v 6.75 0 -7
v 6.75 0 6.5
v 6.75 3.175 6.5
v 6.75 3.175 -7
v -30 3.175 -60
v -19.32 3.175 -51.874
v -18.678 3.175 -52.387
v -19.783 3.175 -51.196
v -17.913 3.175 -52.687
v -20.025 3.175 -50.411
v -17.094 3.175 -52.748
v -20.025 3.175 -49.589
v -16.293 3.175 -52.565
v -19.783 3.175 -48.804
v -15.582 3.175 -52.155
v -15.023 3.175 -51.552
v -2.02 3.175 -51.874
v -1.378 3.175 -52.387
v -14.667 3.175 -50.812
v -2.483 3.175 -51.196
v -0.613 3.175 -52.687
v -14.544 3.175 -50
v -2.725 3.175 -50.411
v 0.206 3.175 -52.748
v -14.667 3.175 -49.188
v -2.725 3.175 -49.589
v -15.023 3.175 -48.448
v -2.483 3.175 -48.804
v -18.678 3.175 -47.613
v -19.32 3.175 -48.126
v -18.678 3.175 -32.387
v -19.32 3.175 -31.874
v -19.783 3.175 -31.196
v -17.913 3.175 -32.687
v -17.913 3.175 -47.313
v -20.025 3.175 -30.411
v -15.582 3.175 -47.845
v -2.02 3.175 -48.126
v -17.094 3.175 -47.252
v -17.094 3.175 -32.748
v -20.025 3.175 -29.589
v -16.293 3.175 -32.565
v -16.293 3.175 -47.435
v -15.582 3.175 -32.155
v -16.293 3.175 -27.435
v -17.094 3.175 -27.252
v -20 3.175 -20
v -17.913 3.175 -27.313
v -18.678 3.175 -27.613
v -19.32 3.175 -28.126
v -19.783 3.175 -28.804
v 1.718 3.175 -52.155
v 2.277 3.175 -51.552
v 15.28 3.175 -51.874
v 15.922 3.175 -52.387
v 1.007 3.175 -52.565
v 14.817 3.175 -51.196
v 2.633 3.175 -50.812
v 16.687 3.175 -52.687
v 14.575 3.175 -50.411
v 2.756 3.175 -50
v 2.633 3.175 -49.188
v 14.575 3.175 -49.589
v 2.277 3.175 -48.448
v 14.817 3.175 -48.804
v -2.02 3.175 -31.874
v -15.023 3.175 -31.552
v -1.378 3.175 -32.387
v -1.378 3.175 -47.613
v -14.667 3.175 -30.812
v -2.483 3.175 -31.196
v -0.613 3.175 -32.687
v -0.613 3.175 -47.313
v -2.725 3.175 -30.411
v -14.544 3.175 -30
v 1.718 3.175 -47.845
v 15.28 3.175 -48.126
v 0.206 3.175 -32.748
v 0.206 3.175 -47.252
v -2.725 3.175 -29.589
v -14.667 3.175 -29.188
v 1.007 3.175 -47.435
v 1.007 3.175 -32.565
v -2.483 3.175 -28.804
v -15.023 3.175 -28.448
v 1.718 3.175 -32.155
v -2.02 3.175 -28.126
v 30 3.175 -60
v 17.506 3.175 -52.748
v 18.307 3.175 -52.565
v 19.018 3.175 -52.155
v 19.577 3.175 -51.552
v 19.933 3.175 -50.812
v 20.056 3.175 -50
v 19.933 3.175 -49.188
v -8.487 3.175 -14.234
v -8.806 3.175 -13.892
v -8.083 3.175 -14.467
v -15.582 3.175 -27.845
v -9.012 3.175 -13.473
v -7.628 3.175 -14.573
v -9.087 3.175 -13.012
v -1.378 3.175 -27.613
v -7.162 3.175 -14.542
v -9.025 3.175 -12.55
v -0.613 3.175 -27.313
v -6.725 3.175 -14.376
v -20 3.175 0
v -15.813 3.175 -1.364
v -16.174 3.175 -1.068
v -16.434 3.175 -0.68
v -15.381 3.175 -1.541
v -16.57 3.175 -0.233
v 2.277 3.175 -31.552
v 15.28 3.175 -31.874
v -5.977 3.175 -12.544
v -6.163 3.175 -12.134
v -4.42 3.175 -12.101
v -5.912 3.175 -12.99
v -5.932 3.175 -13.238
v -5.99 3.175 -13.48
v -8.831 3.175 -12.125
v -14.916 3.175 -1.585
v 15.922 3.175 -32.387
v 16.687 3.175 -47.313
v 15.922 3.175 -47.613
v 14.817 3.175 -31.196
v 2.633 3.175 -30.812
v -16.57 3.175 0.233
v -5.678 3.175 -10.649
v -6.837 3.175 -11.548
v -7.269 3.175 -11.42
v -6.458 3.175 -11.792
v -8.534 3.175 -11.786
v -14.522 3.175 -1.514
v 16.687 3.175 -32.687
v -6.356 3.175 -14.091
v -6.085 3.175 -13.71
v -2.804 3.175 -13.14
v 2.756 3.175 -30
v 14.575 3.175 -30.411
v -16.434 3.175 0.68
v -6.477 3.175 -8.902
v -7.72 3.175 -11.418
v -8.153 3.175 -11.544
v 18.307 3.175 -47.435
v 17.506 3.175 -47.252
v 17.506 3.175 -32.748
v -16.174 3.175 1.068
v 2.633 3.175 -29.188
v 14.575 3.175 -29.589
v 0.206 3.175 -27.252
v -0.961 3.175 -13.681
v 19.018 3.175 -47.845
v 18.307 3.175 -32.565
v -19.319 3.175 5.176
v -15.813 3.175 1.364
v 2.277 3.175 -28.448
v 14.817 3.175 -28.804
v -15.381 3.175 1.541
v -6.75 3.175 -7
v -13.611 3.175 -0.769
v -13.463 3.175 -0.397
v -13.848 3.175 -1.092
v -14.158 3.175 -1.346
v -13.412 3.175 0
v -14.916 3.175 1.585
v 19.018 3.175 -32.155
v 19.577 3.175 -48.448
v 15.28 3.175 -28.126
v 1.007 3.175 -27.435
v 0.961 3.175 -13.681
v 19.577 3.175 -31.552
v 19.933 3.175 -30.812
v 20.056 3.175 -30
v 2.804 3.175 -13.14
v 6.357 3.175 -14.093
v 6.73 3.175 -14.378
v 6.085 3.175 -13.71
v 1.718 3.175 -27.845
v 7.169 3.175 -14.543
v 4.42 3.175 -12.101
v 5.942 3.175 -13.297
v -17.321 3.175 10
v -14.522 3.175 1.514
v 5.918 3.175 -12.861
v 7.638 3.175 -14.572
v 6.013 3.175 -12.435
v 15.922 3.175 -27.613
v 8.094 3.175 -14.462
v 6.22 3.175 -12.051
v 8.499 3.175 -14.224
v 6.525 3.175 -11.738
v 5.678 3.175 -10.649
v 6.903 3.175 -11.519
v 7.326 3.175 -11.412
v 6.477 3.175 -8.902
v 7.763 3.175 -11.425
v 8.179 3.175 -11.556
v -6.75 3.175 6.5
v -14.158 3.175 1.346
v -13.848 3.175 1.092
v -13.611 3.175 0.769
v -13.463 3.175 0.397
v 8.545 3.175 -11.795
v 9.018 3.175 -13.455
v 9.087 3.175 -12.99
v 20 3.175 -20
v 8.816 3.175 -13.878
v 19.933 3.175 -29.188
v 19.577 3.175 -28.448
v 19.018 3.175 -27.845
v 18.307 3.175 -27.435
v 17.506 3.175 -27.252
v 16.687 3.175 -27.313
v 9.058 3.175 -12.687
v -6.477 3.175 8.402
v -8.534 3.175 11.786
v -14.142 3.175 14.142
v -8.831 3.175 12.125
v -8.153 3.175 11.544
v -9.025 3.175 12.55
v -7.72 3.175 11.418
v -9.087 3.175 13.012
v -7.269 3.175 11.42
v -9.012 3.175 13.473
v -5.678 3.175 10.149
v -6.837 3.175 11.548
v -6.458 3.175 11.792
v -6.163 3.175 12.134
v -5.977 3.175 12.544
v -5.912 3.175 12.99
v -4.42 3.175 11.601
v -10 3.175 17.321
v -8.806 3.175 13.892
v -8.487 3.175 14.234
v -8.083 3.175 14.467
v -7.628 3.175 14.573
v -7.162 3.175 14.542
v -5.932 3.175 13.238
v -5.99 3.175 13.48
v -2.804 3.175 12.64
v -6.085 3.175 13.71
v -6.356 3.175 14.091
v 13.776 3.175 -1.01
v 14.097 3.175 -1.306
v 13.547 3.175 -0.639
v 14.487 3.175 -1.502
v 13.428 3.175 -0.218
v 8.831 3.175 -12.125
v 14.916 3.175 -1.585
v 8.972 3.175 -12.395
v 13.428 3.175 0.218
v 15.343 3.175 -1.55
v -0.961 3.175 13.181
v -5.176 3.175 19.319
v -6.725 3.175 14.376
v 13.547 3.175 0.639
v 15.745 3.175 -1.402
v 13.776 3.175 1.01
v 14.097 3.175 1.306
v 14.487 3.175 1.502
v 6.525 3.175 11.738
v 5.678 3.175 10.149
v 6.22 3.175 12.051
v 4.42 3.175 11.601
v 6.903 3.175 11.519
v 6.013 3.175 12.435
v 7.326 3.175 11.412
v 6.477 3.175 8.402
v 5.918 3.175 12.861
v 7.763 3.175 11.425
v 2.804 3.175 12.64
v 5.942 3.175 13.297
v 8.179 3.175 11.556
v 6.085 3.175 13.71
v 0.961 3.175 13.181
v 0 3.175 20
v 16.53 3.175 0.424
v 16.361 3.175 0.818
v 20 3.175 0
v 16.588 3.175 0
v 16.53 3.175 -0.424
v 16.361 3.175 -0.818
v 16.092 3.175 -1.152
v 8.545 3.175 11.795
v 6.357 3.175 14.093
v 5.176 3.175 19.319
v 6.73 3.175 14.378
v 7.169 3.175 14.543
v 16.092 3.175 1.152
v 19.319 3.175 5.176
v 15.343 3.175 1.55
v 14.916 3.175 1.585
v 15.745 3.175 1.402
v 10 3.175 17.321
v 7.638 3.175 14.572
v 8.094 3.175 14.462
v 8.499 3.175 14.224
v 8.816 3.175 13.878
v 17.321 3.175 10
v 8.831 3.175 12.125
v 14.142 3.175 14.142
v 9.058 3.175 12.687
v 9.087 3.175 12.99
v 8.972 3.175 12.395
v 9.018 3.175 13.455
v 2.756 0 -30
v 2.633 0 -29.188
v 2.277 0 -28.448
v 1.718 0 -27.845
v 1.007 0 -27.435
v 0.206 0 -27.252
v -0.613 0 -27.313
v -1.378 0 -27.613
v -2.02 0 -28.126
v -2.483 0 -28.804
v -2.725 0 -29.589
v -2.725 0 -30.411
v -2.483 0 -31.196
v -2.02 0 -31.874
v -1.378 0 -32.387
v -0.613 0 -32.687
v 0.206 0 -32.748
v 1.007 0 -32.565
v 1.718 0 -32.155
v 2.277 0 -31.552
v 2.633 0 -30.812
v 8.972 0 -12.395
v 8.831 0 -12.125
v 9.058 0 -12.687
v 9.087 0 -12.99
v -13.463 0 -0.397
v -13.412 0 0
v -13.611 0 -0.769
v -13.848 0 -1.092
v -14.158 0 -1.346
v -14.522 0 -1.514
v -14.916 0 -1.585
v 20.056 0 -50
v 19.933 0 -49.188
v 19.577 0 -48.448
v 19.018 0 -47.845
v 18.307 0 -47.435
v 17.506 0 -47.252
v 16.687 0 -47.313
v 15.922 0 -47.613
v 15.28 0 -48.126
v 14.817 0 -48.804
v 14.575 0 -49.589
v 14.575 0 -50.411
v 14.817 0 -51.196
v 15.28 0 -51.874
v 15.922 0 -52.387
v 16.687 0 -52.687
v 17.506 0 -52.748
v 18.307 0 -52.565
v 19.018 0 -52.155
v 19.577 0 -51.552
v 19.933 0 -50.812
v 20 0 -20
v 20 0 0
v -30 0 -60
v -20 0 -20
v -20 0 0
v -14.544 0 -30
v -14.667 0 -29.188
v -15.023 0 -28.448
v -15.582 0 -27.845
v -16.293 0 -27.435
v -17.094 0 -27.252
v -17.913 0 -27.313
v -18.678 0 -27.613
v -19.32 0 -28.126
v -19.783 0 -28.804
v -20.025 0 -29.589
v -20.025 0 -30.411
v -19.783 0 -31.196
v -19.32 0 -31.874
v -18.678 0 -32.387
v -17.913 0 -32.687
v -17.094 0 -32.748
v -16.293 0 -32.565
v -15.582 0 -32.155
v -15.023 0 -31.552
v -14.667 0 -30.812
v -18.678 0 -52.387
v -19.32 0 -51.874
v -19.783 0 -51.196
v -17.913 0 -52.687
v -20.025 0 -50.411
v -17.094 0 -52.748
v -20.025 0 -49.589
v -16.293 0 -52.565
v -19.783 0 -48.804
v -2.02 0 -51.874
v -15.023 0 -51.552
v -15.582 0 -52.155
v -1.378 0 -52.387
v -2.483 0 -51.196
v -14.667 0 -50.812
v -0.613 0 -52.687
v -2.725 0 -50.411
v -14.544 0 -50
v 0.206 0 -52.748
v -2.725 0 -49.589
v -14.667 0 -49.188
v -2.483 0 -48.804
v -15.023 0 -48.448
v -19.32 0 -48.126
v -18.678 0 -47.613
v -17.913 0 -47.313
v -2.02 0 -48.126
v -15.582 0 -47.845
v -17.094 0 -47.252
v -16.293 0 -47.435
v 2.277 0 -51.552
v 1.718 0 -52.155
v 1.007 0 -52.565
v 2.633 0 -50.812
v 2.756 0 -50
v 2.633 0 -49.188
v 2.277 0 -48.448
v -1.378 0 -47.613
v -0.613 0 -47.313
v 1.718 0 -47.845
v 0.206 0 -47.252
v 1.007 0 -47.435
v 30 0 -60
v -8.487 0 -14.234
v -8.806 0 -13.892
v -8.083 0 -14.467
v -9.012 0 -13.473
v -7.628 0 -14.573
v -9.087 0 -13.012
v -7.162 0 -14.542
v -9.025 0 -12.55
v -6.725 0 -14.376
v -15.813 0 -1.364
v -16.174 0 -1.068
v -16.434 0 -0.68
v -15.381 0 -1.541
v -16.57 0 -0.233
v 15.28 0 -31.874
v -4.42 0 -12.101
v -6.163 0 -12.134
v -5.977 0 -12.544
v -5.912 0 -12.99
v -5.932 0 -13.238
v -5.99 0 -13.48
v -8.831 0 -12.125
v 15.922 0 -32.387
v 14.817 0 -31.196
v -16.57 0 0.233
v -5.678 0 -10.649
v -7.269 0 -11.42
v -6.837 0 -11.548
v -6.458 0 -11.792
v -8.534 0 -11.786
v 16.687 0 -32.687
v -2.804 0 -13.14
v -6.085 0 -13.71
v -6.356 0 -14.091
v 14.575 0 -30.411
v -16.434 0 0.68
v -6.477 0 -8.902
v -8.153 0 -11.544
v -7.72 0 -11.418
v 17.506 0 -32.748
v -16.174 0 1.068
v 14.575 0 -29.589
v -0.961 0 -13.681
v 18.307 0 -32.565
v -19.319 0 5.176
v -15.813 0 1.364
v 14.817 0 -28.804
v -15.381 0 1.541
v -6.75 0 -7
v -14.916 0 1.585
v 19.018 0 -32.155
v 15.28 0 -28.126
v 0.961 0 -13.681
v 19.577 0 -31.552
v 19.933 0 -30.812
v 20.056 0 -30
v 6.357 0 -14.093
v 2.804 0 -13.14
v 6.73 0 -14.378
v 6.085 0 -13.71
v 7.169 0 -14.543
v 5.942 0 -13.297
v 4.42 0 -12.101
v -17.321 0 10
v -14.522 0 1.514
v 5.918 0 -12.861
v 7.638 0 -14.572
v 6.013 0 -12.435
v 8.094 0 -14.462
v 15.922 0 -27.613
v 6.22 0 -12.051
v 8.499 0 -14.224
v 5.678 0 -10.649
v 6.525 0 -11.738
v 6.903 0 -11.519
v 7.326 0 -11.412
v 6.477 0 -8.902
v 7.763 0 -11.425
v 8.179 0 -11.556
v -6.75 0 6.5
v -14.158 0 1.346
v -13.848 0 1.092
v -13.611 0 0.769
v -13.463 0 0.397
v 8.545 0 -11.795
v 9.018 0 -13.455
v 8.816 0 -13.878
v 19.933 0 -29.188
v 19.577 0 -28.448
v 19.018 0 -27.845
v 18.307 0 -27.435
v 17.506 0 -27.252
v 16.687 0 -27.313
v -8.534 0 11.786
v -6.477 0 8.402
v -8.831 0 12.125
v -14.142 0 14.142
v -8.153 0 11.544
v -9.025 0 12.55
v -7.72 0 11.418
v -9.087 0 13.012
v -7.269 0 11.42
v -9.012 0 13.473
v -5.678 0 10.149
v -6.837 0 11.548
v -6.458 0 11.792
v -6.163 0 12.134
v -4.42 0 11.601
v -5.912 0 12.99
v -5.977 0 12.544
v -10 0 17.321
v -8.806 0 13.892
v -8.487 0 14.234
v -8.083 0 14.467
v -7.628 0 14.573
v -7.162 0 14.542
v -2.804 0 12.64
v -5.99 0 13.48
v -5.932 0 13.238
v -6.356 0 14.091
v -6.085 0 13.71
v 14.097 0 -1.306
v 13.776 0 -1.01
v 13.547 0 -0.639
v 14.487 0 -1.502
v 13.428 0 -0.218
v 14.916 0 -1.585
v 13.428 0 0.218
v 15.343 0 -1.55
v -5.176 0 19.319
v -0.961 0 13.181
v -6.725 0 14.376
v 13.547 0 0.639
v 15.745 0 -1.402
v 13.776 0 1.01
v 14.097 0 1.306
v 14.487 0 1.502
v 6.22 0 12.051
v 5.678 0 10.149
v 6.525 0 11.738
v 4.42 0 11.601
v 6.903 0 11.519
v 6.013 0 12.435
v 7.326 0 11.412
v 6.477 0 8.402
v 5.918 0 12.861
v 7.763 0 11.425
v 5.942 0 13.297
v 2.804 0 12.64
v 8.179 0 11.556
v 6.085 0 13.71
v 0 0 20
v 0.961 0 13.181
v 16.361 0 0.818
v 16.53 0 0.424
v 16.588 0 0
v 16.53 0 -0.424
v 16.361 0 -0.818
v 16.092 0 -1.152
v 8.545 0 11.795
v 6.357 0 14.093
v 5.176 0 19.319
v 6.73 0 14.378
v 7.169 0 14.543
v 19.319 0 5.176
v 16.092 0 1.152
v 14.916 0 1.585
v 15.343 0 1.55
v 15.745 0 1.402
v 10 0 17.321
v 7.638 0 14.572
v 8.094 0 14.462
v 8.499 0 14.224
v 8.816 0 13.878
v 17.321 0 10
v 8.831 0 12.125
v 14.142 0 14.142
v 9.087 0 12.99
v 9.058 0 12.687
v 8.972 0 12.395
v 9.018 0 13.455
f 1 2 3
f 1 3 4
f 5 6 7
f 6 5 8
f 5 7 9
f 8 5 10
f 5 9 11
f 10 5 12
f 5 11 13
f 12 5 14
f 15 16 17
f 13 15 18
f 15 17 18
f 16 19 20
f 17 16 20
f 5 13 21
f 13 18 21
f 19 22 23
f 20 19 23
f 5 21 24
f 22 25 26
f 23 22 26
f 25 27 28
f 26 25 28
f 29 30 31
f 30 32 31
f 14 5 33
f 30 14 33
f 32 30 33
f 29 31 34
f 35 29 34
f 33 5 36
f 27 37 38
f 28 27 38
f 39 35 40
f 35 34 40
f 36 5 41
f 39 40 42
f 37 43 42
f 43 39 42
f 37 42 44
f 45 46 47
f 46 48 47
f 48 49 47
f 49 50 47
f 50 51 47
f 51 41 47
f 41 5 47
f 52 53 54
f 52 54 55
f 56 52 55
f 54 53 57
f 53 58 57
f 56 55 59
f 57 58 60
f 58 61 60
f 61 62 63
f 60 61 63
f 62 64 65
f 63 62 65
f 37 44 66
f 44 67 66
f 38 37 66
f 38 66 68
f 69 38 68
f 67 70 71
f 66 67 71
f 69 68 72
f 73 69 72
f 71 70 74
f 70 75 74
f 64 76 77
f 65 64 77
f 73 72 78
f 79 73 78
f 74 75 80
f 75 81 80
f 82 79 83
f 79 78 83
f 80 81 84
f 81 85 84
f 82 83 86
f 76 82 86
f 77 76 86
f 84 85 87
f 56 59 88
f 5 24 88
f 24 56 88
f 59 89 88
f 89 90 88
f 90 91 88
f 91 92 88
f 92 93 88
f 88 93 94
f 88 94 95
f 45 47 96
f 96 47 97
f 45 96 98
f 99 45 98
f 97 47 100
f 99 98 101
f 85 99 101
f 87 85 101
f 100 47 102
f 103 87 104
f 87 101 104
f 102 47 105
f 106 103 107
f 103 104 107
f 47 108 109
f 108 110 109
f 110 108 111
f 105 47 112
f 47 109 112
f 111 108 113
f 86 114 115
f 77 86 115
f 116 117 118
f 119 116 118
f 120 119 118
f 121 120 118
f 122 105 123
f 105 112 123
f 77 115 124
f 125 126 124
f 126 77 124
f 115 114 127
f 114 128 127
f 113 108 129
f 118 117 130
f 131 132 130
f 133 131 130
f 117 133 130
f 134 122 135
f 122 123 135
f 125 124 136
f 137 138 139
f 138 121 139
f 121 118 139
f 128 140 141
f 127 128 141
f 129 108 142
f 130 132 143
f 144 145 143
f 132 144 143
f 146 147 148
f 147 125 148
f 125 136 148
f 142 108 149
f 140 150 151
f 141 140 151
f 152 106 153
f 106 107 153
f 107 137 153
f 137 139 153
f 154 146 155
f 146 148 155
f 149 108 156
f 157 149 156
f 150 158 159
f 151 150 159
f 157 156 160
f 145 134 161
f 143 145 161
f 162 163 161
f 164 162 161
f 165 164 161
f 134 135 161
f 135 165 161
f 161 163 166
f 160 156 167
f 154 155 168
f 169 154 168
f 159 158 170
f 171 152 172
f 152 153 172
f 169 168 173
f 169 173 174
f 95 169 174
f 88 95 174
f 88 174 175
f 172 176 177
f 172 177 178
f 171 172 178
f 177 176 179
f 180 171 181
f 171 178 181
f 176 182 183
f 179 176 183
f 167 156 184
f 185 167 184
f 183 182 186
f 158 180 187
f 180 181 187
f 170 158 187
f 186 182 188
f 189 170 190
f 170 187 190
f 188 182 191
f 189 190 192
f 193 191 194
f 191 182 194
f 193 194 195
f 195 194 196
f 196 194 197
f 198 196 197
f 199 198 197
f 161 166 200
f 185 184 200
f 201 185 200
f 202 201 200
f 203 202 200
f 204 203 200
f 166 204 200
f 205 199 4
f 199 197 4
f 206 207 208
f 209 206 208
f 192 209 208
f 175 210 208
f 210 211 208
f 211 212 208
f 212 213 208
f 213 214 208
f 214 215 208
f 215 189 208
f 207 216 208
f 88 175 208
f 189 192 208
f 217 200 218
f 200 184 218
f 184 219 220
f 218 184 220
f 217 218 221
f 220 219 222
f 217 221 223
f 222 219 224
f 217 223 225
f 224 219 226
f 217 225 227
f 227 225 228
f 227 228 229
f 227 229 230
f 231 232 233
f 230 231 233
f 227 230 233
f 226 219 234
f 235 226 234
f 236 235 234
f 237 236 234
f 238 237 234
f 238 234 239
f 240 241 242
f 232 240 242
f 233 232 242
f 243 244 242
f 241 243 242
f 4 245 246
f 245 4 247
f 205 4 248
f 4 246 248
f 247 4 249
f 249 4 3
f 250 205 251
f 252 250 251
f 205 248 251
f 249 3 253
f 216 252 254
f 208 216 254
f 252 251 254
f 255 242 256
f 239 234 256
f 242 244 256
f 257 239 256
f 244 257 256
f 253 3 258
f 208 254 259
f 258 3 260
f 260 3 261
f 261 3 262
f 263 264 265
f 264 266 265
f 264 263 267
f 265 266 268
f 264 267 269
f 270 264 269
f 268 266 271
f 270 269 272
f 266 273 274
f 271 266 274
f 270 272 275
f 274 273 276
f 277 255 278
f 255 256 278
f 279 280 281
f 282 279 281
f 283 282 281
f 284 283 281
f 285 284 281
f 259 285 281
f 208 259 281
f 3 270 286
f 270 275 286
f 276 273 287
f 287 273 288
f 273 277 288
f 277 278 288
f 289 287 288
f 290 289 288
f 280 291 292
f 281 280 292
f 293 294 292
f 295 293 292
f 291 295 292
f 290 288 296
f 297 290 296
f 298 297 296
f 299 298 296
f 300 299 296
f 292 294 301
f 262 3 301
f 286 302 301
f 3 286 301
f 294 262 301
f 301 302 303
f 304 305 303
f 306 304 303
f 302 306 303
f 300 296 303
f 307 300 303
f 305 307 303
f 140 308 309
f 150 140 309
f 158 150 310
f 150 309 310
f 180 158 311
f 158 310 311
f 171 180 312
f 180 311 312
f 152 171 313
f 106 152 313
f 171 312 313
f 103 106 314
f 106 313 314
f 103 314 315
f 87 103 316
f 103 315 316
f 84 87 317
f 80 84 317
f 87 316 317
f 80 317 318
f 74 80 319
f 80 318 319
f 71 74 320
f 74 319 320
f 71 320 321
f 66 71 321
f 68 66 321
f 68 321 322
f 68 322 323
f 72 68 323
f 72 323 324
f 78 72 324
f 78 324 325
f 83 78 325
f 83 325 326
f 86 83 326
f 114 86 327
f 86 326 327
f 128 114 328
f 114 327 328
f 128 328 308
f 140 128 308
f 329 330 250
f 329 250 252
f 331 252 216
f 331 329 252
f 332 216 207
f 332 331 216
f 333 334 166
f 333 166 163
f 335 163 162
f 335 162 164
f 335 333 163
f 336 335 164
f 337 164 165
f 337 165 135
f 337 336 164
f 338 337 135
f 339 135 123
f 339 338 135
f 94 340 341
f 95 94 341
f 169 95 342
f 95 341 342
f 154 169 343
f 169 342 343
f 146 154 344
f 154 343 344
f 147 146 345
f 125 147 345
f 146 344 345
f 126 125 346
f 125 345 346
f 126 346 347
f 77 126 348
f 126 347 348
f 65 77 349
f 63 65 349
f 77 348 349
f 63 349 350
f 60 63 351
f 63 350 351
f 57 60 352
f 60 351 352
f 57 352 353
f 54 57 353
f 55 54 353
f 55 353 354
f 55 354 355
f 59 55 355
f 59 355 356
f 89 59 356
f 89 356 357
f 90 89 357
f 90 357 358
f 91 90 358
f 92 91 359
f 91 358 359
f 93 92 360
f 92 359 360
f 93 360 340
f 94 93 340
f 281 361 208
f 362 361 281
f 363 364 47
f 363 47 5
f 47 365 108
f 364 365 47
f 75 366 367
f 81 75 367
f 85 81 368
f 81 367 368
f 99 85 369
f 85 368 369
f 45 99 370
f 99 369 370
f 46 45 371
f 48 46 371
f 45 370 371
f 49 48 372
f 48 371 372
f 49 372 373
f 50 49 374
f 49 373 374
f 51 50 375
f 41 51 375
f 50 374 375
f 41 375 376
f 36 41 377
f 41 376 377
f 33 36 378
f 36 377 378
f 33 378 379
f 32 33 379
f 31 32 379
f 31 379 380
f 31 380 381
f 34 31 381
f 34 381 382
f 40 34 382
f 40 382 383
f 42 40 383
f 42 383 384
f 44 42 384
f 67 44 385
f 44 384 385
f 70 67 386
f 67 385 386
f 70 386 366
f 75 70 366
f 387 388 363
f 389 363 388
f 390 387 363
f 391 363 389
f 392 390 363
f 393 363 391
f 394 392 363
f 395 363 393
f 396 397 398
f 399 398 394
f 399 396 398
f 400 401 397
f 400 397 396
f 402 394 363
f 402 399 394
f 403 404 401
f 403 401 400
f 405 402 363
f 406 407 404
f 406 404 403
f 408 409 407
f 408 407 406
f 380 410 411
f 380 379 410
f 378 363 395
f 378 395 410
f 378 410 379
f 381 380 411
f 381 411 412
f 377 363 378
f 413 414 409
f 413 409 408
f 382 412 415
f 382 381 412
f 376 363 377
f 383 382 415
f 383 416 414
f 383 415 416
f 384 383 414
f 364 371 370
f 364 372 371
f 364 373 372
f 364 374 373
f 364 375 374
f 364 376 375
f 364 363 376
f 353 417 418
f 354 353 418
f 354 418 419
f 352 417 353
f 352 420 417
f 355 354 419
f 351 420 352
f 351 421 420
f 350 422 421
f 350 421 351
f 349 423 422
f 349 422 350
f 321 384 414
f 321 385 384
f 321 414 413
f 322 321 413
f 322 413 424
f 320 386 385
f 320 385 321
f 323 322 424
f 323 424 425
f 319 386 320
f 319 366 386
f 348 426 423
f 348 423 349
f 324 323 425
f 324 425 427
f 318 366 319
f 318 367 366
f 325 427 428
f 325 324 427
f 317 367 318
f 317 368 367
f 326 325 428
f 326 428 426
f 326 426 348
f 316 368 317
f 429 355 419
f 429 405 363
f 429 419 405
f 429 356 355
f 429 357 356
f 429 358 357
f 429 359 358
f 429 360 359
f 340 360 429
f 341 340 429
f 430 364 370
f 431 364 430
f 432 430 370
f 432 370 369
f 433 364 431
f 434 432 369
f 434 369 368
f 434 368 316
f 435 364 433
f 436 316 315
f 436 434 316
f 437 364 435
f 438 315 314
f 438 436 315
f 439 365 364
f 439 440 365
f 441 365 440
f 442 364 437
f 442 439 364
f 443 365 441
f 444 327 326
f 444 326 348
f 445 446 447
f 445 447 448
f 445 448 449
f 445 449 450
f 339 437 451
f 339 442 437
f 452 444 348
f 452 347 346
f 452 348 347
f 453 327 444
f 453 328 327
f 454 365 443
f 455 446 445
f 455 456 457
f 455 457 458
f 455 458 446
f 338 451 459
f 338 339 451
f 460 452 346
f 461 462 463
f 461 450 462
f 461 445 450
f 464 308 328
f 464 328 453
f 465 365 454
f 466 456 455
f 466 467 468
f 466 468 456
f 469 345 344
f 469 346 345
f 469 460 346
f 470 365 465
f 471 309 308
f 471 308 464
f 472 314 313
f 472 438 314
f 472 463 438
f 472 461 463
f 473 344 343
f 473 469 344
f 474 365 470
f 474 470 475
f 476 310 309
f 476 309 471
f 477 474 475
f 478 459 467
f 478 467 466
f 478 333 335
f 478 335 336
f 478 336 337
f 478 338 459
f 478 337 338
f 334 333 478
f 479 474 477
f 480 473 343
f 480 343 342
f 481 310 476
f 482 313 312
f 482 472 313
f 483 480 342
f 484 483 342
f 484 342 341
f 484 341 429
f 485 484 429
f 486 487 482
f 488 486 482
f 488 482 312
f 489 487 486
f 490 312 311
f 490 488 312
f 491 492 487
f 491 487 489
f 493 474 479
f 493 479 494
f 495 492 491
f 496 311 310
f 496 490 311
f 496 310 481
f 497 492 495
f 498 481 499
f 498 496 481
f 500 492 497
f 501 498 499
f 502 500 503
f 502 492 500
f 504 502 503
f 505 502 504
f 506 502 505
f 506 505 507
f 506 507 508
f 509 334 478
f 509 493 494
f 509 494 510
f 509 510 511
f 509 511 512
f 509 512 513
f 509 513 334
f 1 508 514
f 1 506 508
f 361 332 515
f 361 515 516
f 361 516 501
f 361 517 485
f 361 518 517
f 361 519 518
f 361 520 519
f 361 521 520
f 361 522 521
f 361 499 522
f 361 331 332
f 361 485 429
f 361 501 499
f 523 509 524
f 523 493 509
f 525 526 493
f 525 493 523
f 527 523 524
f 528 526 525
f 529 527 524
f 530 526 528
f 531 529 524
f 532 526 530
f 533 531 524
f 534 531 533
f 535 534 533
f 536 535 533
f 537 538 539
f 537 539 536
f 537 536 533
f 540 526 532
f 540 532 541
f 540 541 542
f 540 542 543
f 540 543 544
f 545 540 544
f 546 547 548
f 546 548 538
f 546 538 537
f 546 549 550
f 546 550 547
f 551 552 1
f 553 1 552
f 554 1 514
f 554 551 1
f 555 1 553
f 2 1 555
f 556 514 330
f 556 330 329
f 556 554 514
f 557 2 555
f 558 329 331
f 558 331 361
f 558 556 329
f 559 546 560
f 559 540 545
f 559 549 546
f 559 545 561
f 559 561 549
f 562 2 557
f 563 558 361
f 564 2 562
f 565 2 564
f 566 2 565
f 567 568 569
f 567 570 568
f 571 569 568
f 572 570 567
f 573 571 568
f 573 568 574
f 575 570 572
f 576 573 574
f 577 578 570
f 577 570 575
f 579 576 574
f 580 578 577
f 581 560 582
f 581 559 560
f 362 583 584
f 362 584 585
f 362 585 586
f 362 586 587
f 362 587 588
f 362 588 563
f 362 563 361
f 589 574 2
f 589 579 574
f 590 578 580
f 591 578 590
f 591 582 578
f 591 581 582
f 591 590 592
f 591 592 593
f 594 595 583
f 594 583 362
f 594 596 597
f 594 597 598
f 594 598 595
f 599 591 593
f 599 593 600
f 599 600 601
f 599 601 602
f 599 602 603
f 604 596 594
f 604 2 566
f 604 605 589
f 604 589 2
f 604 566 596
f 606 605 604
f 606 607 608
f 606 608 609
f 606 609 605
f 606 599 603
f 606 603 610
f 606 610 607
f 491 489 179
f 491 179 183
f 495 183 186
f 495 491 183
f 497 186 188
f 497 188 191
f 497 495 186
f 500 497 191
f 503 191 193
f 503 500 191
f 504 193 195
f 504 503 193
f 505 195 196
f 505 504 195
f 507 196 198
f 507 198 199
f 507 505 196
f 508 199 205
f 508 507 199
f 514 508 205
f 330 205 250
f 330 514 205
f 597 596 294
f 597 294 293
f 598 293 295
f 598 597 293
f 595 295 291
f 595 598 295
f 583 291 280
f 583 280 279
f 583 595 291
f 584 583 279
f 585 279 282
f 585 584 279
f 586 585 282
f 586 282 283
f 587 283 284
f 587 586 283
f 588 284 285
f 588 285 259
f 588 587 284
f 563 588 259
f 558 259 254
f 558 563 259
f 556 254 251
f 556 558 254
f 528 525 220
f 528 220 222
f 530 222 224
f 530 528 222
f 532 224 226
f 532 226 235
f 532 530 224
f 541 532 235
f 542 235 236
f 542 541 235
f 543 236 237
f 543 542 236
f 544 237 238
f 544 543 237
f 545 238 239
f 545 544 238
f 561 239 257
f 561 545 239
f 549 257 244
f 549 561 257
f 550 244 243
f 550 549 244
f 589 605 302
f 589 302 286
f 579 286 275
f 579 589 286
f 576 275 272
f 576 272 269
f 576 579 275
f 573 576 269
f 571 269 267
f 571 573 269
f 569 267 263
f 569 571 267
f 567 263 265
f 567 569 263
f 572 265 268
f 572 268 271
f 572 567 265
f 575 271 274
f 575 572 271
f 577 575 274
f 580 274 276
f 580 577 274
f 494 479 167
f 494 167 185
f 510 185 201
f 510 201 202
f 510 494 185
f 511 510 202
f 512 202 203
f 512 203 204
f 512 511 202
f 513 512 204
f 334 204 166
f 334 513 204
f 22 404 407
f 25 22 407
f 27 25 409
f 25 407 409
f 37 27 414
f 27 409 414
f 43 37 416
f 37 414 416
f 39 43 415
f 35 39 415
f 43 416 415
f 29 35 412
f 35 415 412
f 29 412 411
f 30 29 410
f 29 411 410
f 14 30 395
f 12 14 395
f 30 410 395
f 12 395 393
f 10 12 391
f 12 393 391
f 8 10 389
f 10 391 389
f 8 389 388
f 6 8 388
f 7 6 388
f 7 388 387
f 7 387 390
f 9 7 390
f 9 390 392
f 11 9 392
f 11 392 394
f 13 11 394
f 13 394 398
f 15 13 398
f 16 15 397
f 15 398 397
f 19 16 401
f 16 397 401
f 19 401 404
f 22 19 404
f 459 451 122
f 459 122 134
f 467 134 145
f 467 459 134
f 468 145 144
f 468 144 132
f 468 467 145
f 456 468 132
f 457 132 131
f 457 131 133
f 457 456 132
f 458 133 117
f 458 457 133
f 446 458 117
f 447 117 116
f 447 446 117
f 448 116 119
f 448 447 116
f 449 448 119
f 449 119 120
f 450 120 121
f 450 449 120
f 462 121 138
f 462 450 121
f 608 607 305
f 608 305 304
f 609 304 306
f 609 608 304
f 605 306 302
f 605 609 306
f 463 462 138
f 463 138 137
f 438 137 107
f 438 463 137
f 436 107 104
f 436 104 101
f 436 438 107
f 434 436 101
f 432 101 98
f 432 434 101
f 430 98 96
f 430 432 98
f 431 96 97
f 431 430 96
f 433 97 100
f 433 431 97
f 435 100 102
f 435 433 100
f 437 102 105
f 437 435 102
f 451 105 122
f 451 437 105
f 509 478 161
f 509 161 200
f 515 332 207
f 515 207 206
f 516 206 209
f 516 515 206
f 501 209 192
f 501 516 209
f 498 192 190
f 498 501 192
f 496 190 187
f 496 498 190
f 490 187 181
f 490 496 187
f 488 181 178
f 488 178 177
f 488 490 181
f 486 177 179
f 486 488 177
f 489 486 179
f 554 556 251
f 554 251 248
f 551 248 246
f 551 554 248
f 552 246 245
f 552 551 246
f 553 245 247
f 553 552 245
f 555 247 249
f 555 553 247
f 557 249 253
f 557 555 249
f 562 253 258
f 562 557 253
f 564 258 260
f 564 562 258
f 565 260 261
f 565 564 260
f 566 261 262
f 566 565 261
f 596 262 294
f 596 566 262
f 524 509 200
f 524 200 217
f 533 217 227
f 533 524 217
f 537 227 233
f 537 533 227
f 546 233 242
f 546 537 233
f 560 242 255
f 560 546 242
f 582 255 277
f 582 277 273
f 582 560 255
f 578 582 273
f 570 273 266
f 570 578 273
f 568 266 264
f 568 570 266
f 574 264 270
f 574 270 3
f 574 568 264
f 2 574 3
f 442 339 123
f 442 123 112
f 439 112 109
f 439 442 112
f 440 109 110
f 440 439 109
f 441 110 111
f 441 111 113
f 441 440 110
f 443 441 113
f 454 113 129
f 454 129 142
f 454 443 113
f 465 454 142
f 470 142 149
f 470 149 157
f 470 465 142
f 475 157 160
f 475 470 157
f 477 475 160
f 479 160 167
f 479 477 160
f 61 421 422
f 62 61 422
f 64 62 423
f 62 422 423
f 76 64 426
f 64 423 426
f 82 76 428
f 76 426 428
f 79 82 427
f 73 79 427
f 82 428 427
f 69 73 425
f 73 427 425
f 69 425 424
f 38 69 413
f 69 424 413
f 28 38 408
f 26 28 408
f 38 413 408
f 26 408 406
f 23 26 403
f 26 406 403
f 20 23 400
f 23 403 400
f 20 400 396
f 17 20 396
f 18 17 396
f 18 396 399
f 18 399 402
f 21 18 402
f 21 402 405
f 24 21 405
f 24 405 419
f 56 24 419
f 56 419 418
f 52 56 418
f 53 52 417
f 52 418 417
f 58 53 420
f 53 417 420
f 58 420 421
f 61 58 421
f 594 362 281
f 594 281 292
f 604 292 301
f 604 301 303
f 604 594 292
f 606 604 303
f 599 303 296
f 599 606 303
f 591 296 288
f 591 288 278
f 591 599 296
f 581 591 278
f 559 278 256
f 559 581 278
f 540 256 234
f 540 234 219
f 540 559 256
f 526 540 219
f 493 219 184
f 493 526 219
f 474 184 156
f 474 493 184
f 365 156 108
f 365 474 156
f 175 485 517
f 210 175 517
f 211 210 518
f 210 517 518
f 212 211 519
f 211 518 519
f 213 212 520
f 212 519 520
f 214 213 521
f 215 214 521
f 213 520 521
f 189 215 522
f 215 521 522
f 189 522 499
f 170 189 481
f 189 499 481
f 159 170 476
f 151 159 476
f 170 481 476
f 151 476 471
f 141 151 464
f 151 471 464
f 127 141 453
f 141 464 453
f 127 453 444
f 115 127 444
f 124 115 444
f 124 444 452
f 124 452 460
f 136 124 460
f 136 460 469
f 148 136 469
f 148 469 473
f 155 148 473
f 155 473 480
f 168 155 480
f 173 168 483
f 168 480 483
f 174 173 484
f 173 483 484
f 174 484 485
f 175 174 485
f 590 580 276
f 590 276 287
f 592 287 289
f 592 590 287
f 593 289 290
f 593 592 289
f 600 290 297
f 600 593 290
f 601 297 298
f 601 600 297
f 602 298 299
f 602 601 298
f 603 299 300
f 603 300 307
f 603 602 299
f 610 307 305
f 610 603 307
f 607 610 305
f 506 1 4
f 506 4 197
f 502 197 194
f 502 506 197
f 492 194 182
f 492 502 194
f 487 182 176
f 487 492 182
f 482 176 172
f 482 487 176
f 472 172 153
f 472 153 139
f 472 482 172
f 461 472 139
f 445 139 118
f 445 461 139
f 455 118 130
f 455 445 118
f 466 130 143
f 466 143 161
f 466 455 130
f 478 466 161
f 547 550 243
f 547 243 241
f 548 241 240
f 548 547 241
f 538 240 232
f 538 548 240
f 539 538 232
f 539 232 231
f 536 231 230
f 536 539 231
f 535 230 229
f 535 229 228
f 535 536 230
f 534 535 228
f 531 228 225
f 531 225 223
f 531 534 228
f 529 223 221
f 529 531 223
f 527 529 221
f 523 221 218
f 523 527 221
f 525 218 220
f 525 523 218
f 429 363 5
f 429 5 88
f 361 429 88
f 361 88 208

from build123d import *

# Parameters (mm, degrees)
F0_R     = 2.7559
F1_DEPTH = 3.175


with BuildPart() as f1:
    # F0 (on Front) → F1 (new body)
    with BuildSketch(Plane.XZ):
        with BuildLine():
            Line((20, -20), (20, 0))
            ThreePointArc((20, 0), (0, 20), (-20, 0))
            Line((-20, 0), (-20, -20))
            Line((-20, -20), (-30, -60))
            Line((-30, -60), (30, -60))
            Line((30, -60), (20, -20))
        make_face()
        with Locations((-17.3, -49.9999946)):
            Circle(F0_R, mode=Mode.SUBTRACT)
        with Locations((-17.3, -29.9999946)):
            Circle(F0_R, mode=Mode.SUBTRACT)
        with Locations((0, -49.9999946)):
            Circle(F0_R, mode=Mode.SUBTRACT)
        with Locations((17.3, -49.9999946)):
            Circle(F0_R, mode=Mode.SUBTRACT)
        with Locations((0, -29.9999946)):
            Circle(F0_R, mode=Mode.SUBTRACT)
        with Locations((17.3, -29.9999946)):
            Circle(F0_R, mode=Mode.SUBTRACT)
        with BuildLine():
            ThreePointArc((8.8308865142, 12.1249925103), (12.9903810568, 7.5), (14.9159947917, 1.5852758041))
            ThreePointArc((14.9159947917, 1.5852758041), (16.0924280255, 1.151849495), (16.5875, 0))
            ThreePointArc((16.5875, 0), (16.0924280255, -1.151849495), (14.9159947917, -1.5852758041))
            ThreePointArc((14.9159947917, -1.5852758041), (12.9903810568, -7.5), (8.8308865142, -12.1249925103))
            ThreePointArc((8.8308865142, -12.1249925103), (9.0219951694, -12.5390641455), (9.0875, -12.9903810568))
            ThreePointArc((9.0875, -12.9903810568), (7.8701456744, -14.5341259935), (6.0851082775, -13.7102683143))
            ThreePointArc((6.0851082775, -13.7102683143), (0, -15), (-6.0851082775, -13.7102683143))
            ThreePointArc((-6.0851082775, -13.7102683143), (-8.29375, -14.3651963853), (-8.8308865142, -12.1249925103))
            ThreePointArc((-8.8308865142, -12.1249925103), (-12.9903810568, -7.5), (-14.9159947917, -1.5852758041))
            ThreePointArc((-14.9159947917, -1.5852758041), (-16.5875, 0), (-14.9159947917, 1.5852758041))
            ThreePointArc((-14.9159947917, 1.5852758041), (-12.9903810568, 7.5), (-8.8308865142, 12.1249925103))
            ThreePointArc((-8.8308865142, 12.1249925103), (-8.29375, 14.3651963853), (-6.0851082775, 13.7102683143))
            ThreePointArc((-6.0851082775, 13.7102683143), (0, 15), (6.0851082775, 13.7102683143))
            ThreePointArc((6.0851082775, 13.7102683143), (7.8701456744, 14.5341259935), (9.0875, 12.9903810568))
            ThreePointArc((9.0875, 12.9903810568), (9.0219951694, 12.5390641455), (8.8308865142, 12.1249925103))
        make_face(mode=Mode.SUBTRACT)
        with BuildLine():
            ThreePointArc((14.9159947917, -1.5852758041), (13.4125, 0), (14.9159947917, 1.5852758041))
            ThreePointArc((14.9159947917, 1.5852758041), (12.9903810568, 7.5), (8.8308865142, 12.1249925103))
            ThreePointArc((8.8308865142, 12.1249925103), (6.70625, 11.6155657283), (6.0851082775, 13.7102683143))
            ThreePointArc((6.0851082775, 13.7102683143), (0, 15), (-6.0851082775, 13.7102683143))
            ThreePointArc((-6.0851082775, 13.7102683143), (-5.9562550633, 13.3605267312), (-5.9125, 12.9903810568))
            ThreePointArc((-5.9125, 12.9903810568), (-7.0486830887, 11.4683858874), (-8.8308865142, 12.1249925103))
            ThreePointArc((-8.8308865142, 12.1249925103), (-12.9903810568, 7.5), (-14.9159947917, 1.5852758041))
            ThreePointArc((-14.9159947917, 1.5852758041), (-13.848150505, 1.0924280255), (-13.4125, 0))
            ThreePointArc((-13.4125, 0), (-13.848150505, -1.0924280255), (-14.9159947917, -1.5852758041))
            ThreePointArc((-14.9159947917, -1.5852758041), (-12.9903810568, -7.5), (-8.8308865142, -12.1249925103))
            ThreePointArc((-8.8308865142, -12.1249925103), (-7.0486830887, -11.4683858874), (-5.9125, -12.9903810568))
            ThreePointArc((-5.9125, -12.9903810568), (-5.9562550633, -13.3605267312), (-6.0851082775, -13.7102683143))
            ThreePointArc((-6.0851082775, -13.7102683143), (0, -15), (6.0851082775, -13.7102683143))
            ThreePointArc((6.0851082775, -13.7102683143), (6.70625, -11.6155657283), (8.8308865142, -12.1249925103))
            ThreePointArc((8.8308865142, -12.1249925103), (12.9903810568, -7.5), (14.9159947917, -1.5852758041))
        make_face()
        with BuildLine():
            ThreePointArc((-6.75, 6.5), (0, 13.25), (6.75, 6.5))
            Line((6.75, 6.5), (6.75, -7))
            ThreePointArc((6.75, -7), (0, -13.75), (-6.75, -7))
            Line((-6.75, -7), (-6.75, 6.5))
        make_face(mode=Mode.SUBTRACT)
    extrude(amount=-F1_DEPTH)


solid = f1.part
